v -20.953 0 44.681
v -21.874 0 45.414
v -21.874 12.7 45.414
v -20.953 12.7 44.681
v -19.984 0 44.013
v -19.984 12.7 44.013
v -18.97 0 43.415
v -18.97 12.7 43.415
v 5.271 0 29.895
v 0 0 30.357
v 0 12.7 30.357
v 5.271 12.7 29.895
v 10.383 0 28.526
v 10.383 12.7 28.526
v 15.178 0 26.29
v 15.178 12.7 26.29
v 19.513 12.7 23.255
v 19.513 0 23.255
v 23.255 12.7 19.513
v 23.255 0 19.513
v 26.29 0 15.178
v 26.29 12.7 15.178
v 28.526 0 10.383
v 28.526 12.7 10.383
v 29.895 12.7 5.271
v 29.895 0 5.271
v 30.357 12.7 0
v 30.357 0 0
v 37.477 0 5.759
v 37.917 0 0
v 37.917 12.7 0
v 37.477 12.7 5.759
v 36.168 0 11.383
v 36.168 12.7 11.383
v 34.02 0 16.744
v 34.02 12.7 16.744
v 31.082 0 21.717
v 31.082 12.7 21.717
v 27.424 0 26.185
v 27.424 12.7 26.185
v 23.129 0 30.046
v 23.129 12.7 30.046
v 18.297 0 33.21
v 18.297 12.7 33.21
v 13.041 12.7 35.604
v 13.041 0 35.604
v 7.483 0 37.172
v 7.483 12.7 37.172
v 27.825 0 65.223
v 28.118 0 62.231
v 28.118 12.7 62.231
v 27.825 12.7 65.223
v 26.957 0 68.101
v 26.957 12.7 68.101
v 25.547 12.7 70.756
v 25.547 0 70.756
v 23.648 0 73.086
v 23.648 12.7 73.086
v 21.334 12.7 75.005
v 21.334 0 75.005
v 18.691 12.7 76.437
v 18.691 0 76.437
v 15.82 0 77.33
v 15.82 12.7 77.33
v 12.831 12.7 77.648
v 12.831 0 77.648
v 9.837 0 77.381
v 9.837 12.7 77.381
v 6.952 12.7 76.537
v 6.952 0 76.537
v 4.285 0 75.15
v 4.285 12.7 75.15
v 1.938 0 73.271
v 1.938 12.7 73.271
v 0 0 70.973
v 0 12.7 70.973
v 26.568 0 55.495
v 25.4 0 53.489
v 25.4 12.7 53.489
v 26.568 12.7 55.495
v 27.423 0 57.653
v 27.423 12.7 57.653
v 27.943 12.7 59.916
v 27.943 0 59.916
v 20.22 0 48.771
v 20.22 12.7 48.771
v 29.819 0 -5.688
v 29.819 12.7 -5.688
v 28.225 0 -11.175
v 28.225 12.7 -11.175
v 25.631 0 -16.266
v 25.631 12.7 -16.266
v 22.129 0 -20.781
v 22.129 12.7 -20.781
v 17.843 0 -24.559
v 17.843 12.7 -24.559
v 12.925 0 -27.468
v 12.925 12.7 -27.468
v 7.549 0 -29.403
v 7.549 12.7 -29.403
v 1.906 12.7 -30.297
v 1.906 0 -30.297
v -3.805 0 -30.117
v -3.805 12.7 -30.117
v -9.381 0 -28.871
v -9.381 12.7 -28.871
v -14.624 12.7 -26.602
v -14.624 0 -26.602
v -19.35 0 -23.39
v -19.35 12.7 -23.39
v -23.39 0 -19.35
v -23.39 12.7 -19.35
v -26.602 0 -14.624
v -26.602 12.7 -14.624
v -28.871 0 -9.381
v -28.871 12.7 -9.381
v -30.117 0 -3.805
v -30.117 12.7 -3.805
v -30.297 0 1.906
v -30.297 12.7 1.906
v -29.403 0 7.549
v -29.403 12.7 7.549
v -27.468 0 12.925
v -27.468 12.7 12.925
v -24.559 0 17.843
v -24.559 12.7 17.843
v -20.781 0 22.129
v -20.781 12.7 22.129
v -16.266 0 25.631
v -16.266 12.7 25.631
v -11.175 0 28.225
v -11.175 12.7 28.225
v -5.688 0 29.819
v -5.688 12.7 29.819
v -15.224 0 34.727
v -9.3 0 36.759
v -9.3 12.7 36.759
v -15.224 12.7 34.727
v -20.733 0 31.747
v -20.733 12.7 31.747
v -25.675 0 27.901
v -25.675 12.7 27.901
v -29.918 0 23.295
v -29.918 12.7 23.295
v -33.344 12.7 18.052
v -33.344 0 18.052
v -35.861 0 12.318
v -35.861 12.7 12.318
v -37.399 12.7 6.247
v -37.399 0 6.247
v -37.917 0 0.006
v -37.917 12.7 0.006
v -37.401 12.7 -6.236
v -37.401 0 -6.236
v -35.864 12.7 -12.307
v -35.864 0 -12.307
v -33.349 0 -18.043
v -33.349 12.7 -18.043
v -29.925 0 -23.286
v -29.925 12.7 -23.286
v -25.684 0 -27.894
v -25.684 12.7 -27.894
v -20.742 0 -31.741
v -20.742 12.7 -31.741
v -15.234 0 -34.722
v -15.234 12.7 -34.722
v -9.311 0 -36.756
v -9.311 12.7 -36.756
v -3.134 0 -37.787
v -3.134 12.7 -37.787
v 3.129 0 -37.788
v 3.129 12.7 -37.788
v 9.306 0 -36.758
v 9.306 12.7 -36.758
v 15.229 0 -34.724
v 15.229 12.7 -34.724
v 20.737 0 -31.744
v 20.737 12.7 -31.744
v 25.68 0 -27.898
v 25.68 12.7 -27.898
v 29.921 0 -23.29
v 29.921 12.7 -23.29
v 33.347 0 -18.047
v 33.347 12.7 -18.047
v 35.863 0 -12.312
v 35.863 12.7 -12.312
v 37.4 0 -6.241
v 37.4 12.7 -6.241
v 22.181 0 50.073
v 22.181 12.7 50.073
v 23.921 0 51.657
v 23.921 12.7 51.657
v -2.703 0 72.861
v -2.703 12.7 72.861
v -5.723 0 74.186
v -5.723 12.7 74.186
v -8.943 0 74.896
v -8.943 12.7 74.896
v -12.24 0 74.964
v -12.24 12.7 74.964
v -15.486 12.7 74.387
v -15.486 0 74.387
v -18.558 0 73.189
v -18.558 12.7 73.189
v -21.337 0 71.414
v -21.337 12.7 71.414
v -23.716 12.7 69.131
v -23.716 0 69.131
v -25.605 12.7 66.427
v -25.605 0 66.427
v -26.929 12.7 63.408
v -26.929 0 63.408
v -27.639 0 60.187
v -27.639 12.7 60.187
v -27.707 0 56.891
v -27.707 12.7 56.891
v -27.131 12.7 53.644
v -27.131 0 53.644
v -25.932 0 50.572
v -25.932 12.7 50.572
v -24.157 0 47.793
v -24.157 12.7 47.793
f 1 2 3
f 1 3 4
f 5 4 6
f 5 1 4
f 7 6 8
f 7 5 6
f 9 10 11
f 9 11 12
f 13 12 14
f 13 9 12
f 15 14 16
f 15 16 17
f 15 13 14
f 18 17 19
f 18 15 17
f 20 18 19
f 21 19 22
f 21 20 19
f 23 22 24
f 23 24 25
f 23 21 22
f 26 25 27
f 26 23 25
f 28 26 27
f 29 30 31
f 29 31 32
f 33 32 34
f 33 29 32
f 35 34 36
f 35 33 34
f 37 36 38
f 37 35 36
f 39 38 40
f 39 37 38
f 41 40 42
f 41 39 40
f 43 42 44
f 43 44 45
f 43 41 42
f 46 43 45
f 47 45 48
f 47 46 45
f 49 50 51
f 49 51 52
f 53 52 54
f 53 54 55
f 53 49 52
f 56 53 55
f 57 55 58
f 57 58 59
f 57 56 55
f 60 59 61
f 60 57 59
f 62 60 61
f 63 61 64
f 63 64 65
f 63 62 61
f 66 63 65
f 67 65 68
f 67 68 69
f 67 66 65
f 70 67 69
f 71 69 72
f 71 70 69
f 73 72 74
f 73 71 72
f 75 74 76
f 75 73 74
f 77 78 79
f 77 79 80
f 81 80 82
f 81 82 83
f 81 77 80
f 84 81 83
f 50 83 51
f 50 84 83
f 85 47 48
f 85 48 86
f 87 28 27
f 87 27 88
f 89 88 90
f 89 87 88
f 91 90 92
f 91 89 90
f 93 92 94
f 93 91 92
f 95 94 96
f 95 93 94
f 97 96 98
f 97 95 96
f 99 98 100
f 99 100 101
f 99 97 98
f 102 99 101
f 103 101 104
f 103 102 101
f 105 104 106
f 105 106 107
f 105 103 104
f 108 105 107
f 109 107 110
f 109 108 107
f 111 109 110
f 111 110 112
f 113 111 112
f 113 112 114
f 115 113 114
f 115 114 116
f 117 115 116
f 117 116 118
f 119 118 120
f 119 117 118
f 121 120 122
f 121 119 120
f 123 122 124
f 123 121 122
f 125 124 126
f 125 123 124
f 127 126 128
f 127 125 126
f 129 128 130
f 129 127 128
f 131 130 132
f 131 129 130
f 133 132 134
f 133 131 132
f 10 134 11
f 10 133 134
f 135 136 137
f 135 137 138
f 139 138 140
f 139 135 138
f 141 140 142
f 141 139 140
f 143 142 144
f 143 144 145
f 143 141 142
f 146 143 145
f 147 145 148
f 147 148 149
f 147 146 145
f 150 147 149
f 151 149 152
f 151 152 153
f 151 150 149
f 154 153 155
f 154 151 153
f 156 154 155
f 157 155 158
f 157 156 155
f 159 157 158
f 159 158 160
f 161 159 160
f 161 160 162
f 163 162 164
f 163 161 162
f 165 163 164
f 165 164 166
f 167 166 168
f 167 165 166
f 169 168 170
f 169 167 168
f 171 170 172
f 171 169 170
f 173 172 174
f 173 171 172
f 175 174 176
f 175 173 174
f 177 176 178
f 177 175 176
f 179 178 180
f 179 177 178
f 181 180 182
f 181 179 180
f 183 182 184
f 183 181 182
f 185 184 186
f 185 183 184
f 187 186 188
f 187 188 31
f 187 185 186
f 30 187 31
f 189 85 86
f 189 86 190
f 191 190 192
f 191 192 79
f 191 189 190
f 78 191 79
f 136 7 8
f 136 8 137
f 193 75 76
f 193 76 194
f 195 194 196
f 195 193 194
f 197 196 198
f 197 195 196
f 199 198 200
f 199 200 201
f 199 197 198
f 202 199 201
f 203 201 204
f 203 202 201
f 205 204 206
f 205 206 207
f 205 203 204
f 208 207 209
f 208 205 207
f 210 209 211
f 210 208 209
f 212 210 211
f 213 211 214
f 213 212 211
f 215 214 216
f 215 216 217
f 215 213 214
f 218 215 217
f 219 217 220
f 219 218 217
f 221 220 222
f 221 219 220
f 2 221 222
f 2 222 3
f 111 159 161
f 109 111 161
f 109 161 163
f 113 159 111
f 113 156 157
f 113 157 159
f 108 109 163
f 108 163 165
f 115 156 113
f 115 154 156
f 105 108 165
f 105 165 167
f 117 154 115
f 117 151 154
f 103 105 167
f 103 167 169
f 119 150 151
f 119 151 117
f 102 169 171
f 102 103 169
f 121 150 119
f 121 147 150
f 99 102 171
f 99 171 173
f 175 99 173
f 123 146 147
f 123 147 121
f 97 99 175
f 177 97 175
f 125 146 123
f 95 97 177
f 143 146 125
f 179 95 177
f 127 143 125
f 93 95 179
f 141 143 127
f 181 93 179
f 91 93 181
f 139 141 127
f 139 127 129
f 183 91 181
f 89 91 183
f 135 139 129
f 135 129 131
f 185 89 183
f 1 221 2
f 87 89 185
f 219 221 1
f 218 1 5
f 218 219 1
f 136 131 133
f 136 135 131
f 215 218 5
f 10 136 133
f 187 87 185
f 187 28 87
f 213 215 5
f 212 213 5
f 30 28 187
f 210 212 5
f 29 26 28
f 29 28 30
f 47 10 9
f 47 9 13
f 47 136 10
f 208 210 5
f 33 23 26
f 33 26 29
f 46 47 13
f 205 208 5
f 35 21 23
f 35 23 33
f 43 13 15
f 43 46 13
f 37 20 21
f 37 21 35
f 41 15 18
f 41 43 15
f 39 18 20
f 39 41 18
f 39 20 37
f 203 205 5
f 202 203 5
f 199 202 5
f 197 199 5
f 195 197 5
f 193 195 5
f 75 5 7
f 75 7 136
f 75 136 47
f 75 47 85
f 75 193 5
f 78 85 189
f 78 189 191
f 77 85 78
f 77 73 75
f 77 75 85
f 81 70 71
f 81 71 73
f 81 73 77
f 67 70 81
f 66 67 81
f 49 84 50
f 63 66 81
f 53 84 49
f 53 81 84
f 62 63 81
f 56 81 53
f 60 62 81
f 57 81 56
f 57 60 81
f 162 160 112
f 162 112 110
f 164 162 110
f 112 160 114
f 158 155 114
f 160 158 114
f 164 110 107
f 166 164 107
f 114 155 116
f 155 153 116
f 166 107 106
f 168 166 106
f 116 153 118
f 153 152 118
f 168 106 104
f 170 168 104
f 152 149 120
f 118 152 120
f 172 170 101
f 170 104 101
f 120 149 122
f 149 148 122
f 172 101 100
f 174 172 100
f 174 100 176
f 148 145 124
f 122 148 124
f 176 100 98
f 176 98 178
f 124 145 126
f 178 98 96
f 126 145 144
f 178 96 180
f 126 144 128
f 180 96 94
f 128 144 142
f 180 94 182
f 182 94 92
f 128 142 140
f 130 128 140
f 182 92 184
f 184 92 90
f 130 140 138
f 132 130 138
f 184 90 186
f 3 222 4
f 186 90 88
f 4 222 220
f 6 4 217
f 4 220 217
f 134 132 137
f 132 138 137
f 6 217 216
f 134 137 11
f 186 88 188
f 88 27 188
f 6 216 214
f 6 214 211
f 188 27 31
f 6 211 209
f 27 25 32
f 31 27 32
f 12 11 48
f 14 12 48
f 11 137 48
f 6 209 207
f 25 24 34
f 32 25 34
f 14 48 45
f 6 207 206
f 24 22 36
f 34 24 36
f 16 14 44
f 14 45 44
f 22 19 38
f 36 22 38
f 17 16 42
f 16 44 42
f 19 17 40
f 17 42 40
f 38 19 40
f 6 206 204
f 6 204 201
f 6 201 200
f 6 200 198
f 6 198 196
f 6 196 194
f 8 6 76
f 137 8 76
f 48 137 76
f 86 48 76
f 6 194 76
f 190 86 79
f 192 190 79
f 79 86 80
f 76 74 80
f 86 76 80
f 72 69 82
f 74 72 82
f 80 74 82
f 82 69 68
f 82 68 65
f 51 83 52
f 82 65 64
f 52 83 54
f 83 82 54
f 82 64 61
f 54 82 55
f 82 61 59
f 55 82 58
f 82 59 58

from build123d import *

# Parameters (mm, degrees)
F1_DEPTH  = 12.7
F1_FACE_R = 30.3566666554
F2_DEPTH  = 12.7


with BuildPart() as f1:
    # F0 (on Front) → F1 (new body)
    with BuildSketch(Plane.XZ):
        with BuildLine():
            ThreePointArc((-9.3004843115, 36.7589222648), (-23.2923661717, -29.9196098341), (37.9172437619, 0))
            ThreePointArc((37.9172437619, 0), (29.338119554, 24.020660181), (7.4829580234, 37.1715309574))
            Line((7.4829580234, 37.1715309574), (0, 30.3566666554))
            Line((0, 30.3566666554), (-9.3004843115, 36.7589222648))
        make_face()
        with BuildLine():
            ThreePointArc((30.3566666554, 0), (-21.4654048463, -21.4654048463), (0, 30.3566666554))
            ThreePointArc((0, 30.3566666554), (21.4654048463, 21.4654048463), (30.3566666554, 0))
        make_face(mode=Mode.SUBTRACT)
        with BuildLine():
            Line((0, 30.3566666554), (7.4829580234, 37.1715309574))
            ThreePointArc((7.4829580234, 37.1715309574), (-0.9318862244, 37.9057906205), (-9.3004843115, 36.7589222648))
            Line((-9.3004843115, 36.7589222648), (0, 30.3566666554))
        make_face()
        with BuildLine():
            ThreePointArc((-9.3004843115, 36.7589222648), (-0.9318862244, 37.9057906205), (7.4829580234, 37.1715309574))
            Line((7.4829580234, 37.1715309574), (20.2197378858, 48.7711451921))
            ThreePointArc((20.2197378858, 48.7711451921), (11.7747091364, 46.8406854256), (3.6217325155, 49.7688516961))
            ThreePointArc((3.6217325155, 49.7688516961), (-6.3831384952, 42.0012170686), (-18.9701891405, 43.4153414263))
            Line((-18.9701891405, 43.4153414263), (-9.3004843115, 36.7589222648))
        make_face()
        with BuildLine():
            ThreePointArc((3.6217325155, 49.7688516961), (11.7747091364, 46.8406854256), (20.2197378858, 48.7711451921))
            Line((20.2197378858, 48.7711451921), (25.3996234387, 53.4885600209))
            Line((25.3996234387, 53.4885600209), (0, 70.9731206298))
            ThreePointArc((0, 70.9731206298), (4.3420940931, 65.2280612526), (5.8836441513, 58.193637909))
            ThreePointArc((5.8836441513, 58.193637909), (5.3083274131, 53.8320651714), (3.6217325155, 49.7688516961))
        make_face()
        with BuildLine():
            Line((25.3996234387, 53.4885600209), (20.2197378858, 48.7711451921))
            ThreePointArc((20.2197378858, 48.7711451921), (23.0811869033, 50.8317293109), (25.3996234387, 53.4885600209))
        make_face()
        with BuildLine():
            ThreePointArc((-21.873843285, 45.4141551882), (-20.4745226574, 44.3384727889), (-18.9701891405, 43.4153414263))
            Line((-18.9701891405, 43.4153414263), (-21.873843285, 45.4141551882))
        make_face()
        with BuildLine():
            Line((-21.873843285, 45.4141551882), (-18.9701891405, 43.4153414263))
            ThreePointArc((-18.9701891405, 43.4153414263), (-6.3831384952, 42.0012170686), (3.6217325155, 49.7688516961))
            ThreePointArc((3.6217325155, 49.7688516961), (-2.498029855, 59.6350178914), (0, 70.9731206298))
            Line((0, 70.9731206298), (-21.873843285, 45.4141551882))
        make_face()
        with BuildLine():
            Line((0, 70.9731206298), (25.3996234387, 53.4885600209))
            ThreePointArc((25.3996234387, 53.4885600209), (27.4225414081, 57.653295881), (28.1177455183, 62.2308403254))
            ThreePointArc((28.1177455183, 62.2308403254), (17.2773561637, 76.9535700141), (0, 70.9731206298))
        make_face()
        with BuildLine():
            ThreePointArc((0, 70.9731206298), (-2.498029855, 59.6350178914), (3.6217325155, 49.7688516961))
            ThreePointArc((3.6217325155, 49.7688516961), (5.3083274131, 53.8320651714), (5.8836441513, 58.193637909))
            ThreePointArc((5.8836441513, 58.193637909), (4.3420940931, 65.2280612526), (0, 70.9731206298))
        make_face()
        with BuildLine():
            ThreePointArc((0, 70.9731206298), (-23.7164043633, 69.1305595515), (-21.873843285, 45.4141551882))
            Line((-21.873843285, 45.4141551882), (0, 70.9731206298))
        make_face()
    extrude(amount=-F1_DEPTH)

    # F0 (on Front) + F1_face (on face) → F2 (join)
    with BuildSketch(Plane.XZ):
        with BuildLine():
            ThreePointArc((-9.3004843115, 36.7589222648), (-23.2923661717, -29.9196098341), (37.9172437619, 0))
            ThreePointArc((37.9172437619, 0), (29.338119554, 24.020660181), (7.4829580234, 37.1715309574))
            Line((7.4829580234, 37.1715309574), (0, 30.3566666554))
            Line((0, 30.3566666554), (-9.3004843115, 36.7589222648))
        make_face()
        with BuildLine():
            ThreePointArc((30.3566666554, 0), (-21.4654048463, -21.4654048463), (0, 30.3566666554))
            ThreePointArc((0, 30.3566666554), (21.4654048463, 21.4654048463), (30.3566666554, 0))
        make_face(mode=Mode.SUBTRACT)
        with BuildLine():
            Line((0, 30.3566666554), (7.4829580234, 37.1715309574))
            ThreePointArc((7.4829580234, 37.1715309574), (-0.9318862244, 37.9057906205), (-9.3004843115, 36.7589222648))
            Line((-9.3004843115, 36.7589222648), (0, 30.3566666554))
        make_face()
        with BuildLine():
            ThreePointArc((-9.3004843115, 36.7589222648), (-0.9318862244, 37.9057906205), (7.4829580234, 37.1715309574))
            Line((7.4829580234, 37.1715309574), (20.2197378858, 48.7711451921))
            ThreePointArc((20.2197378858, 48.7711451921), (11.7747091364, 46.8406854256), (3.6217325155, 49.7688516961))
            ThreePointArc((3.6217325155, 49.7688516961), (-6.3831384952, 42.0012170686), (-18.9701891405, 43.4153414263))
            Line((-18.9701891405, 43.4153414263), (-9.3004843115, 36.7589222648))
        make_face()
        with BuildLine():
            ThreePointArc((3.6217325155, 49.7688516961), (11.7747091364, 46.8406854256), (20.2197378858, 48.7711451921))
            Line((20.2197378858, 48.7711451921), (25.3996234387, 53.4885600209))
            Line((25.3996234387, 53.4885600209), (0, 70.9731206298))
            ThreePointArc((0, 70.9731206298), (4.3420940931, 65.2280612526), (5.8836441513, 58.193637909))
            ThreePointArc((5.8836441513, 58.193637909), (5.3083274131, 53.8320651714), (3.6217325155, 49.7688516961))
        make_face()
        with BuildLine():
            Line((25.3996234387, 53.4885600209), (20.2197378858, 48.7711451921))
            ThreePointArc((20.2197378858, 48.7711451921), (23.0811869033, 50.8317293109), (25.3996234387, 53.4885600209))
        make_face()
        with BuildLine():
            ThreePointArc((-21.873843285, 45.4141551882), (-20.4745226574, 44.3384727889), (-18.9701891405, 43.4153414263))
            Line((-18.9701891405, 43.4153414263), (-21.873843285, 45.4141551882))
        make_face()
        with BuildLine():
            Line((-21.873843285, 45.4141551882), (-18.9701891405, 43.4153414263))
            ThreePointArc((-18.9701891405, 43.4153414263), (-6.3831384952, 42.0012170686), (3.6217325155, 49.7688516961))
            ThreePointArc((3.6217325155, 49.7688516961), (-2.498029855, 59.6350178914), (0, 70.9731206298))
            Line((0, 70.9731206298), (-21.873843285, 45.4141551882))
        make_face()
        with BuildLine():
            Line((0, 70.9731206298), (25.3996234387, 53.4885600209))
            ThreePointArc((25.3996234387, 53.4885600209), (27.4225414081, 57.653295881), (28.1177455183, 62.2308403254))
            ThreePointArc((28.1177455183, 62.2308403254), (17.2773561637, 76.9535700141), (0, 70.9731206298))
        make_face()
        with BuildLine():
            ThreePointArc((0, 70.9731206298), (-2.498029855, 59.6350178914), (3.6217325155, 49.7688516961))
            ThreePointArc((3.6217325155, 49.7688516961), (5.3083274131, 53.8320651714), (5.8836441513, 58.193637909))
            ThreePointArc((5.8836441513, 58.193637909), (4.3420940931, 65.2280612526), (0, 70.9731206298))
        make_face()
        with BuildLine():
            ThreePointArc((0, 70.9731206298), (-23.7164043633, 69.1305595515), (-21.873843285, 45.4141551882))
            Line((-21.873843285, 45.4141551882), (0, 70.9731206298))
        make_face()
    with BuildSketch(Plane(origin=(0.0200571073, 0, 29.7715951258), x_dir=(1, 0, 0), z_dir=(0, -1, 0))):
        with BuildLine():
            ThreePointArc((20.1996807784, 18.9995500663), (24.0788656265, 42.8406203835), (-0.0200571073, 41.201525504))
            ThreePointArc((-0.0200571073, 41.201525504), (-24.8121438699, 37.9596437982), (-18.9902462478, 13.6437463005))
            Line((-18.9902462478, 13.6437463005), (-9.3205414189, 6.987327139))
            ThreePointArc((-9.3205414189, 6.987327139), (0.9118291171, -67.6773857463), (7.4629009161, 7.3999358316))
            Line((7.4629009161, 7.3999358316), (20.1996807784, 18.9995500663))
        make_face()
        with Locations((-0.0200571073, -29.7715951258)):
            Circle(F1_FACE_R, mode=Mode.SUBTRACT)
    extrude(amount=-F2_DEPTH)


solid = f1.part
